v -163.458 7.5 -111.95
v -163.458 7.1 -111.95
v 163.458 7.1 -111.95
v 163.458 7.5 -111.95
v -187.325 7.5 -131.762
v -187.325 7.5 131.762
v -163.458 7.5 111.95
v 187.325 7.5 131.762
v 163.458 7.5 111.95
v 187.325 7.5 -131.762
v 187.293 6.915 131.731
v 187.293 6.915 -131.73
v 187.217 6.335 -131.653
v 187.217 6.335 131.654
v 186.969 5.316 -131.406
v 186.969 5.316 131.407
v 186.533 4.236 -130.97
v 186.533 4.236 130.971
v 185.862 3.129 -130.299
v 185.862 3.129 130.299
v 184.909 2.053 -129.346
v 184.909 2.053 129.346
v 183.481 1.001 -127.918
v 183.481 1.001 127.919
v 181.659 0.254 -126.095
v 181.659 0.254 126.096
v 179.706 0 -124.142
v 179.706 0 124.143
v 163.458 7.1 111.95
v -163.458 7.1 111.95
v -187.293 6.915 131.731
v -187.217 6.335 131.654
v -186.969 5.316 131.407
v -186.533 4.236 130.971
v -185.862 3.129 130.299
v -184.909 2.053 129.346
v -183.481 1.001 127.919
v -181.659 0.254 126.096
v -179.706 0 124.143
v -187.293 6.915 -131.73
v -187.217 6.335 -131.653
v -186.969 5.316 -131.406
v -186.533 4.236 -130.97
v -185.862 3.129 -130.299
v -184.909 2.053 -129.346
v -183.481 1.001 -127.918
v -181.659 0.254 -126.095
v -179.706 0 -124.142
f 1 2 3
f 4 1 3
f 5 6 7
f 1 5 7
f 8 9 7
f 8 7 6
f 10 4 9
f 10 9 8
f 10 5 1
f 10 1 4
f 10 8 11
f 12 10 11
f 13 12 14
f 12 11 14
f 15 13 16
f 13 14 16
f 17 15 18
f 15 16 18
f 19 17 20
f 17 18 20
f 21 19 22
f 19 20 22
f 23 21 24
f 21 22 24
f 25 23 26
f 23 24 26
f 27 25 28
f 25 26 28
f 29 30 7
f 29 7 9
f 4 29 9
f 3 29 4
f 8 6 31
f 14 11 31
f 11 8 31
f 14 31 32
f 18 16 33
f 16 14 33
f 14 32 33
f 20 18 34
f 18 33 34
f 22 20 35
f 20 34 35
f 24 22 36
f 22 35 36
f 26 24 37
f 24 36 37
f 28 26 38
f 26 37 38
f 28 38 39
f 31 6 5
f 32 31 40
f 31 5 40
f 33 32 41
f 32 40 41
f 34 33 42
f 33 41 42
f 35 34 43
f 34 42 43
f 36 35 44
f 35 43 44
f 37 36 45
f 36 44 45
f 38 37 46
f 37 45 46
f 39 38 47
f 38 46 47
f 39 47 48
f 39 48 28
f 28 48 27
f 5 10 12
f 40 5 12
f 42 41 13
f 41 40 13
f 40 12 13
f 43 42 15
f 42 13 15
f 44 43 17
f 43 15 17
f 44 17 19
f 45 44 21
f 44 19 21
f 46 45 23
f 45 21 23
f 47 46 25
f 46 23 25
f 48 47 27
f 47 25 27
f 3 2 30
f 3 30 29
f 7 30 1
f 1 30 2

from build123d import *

# Parameters (mm, degrees)
SKETCH1_W           = 374.65
SKETCH1_H           = 263.525
SKETCH1_W_2         = 326.91662515
SKETCH1_H_2         = 223.901
BOSS_EXTRUDE1_DEPTH = 7.5
SKETCH1_2_W         = 326.91662515
SKETCH1_2_H         = 223.901
BOSS_EXTRUDE2_DEPTH = 7.1
FILLET1_R           = 7.62
FILLET2_R           = 7.62


with BuildPart() as part:
    # Sketch1 → Boss-Extrude1 (new body)
    with BuildSketch(Plane(origin=(0, 0, 0), x_dir=(1, 0, 0), z_dir=(0, 1, 0))):
        Rectangle(SKETCH1_W, SKETCH1_H)
        Rectangle(SKETCH1_W_2, SKETCH1_H_2, mode=Mode.SUBTRACT)
    extrude(amount=BOSS_EXTRUDE1_DEPTH)

    # Sketch1<2> → Boss-Extrude2 (add)
    with BuildSketch(Plane(origin=(0, 0, 0), x_dir=(1, 0, 0), z_dir=(0, 1, 0))):
        Rectangle(SKETCH1_2_W, SKETCH1_2_H)
    extrude(amount=BOSS_EXTRUDE2_DEPTH)

    # Fillet1
    # the kernel refuses this fillet: 7.62 mm, written as the material it takes off along each edge
    with BuildSketch(Plane(origin=(206.375, 0, -131.7625), x_dir=(0, 0, 1), z_dir=(-1, 0, 0))) as fillet1_piece_1:
        with BuildLine():
            CenterArc((FILLET1_R, FILLET1_R), FILLET1_R, 180, 90)
            Line((0, FILLET1_R), (0, 0))
            Line((0, 0), (FILLET1_R, 0))
        make_face()
    extrude(amount=412.75, mode=Mode.SUBTRACT)

    # Fillet2
    # the kernel refuses this fillet: 7.62 mm, written as the material it takes off along each edge
    with BuildSketch(Plane(origin=(-187.325, 0, -143.190137649), x_dir=(0, 1, 0), z_dir=(0, 0, 1)), Plane(origin=(187.325, 0, 150.810137649), x_dir=(0, 1, 0), z_dir=(0, 0, -1))) as fillet2_piece_1:
        with BuildLine():
            CenterArc((7.62, -7.61905506), FILLET2_R, 90.902333039, 89.097666961)
            Line((0, -7.61905506), (-0.1524, -7.61905506))
            Line((-0.1524, -7.61905506), (-0.1524, 0))
            Line((-0.1524, 0), (0, 0.1524))
            ThreePointArc((0, 0.1524), (3.75, 0.1524), (7.4976, 0.152381101))
            Line((7.4976, 0.152381101), (7.5, 0))
        make_face()
    extrude(amount=294.000275298, mode=Mode.SUBTRACT)
    with BuildSketch(Plane(origin=(-206.372637649, 0, 131.7625), x_dir=(0, 1, 0), z_dir=(1, 0, 0))) as fillet2_piece_2:
        with BuildLine():
            CenterArc((7.62, -7.61905506), FILLET2_R, 90.902333039, 89.097666961)
            Line((0, -7.61905506), (-0.1524, -7.61905506))
            Line((-0.1524, -7.61905506), (-0.1524, 0))
            Line((-0.1524, 0), (0, 0.1524))
            ThreePointArc((0, 0.1524), (3.75, 0.1524), (7.4976, 0.152381101))
            Line((7.4976, 0.152381101), (7.5, 0))
        make_face()
    extrude(amount=412.745275298, mode=Mode.SUBTRACT)


solid = part.part
